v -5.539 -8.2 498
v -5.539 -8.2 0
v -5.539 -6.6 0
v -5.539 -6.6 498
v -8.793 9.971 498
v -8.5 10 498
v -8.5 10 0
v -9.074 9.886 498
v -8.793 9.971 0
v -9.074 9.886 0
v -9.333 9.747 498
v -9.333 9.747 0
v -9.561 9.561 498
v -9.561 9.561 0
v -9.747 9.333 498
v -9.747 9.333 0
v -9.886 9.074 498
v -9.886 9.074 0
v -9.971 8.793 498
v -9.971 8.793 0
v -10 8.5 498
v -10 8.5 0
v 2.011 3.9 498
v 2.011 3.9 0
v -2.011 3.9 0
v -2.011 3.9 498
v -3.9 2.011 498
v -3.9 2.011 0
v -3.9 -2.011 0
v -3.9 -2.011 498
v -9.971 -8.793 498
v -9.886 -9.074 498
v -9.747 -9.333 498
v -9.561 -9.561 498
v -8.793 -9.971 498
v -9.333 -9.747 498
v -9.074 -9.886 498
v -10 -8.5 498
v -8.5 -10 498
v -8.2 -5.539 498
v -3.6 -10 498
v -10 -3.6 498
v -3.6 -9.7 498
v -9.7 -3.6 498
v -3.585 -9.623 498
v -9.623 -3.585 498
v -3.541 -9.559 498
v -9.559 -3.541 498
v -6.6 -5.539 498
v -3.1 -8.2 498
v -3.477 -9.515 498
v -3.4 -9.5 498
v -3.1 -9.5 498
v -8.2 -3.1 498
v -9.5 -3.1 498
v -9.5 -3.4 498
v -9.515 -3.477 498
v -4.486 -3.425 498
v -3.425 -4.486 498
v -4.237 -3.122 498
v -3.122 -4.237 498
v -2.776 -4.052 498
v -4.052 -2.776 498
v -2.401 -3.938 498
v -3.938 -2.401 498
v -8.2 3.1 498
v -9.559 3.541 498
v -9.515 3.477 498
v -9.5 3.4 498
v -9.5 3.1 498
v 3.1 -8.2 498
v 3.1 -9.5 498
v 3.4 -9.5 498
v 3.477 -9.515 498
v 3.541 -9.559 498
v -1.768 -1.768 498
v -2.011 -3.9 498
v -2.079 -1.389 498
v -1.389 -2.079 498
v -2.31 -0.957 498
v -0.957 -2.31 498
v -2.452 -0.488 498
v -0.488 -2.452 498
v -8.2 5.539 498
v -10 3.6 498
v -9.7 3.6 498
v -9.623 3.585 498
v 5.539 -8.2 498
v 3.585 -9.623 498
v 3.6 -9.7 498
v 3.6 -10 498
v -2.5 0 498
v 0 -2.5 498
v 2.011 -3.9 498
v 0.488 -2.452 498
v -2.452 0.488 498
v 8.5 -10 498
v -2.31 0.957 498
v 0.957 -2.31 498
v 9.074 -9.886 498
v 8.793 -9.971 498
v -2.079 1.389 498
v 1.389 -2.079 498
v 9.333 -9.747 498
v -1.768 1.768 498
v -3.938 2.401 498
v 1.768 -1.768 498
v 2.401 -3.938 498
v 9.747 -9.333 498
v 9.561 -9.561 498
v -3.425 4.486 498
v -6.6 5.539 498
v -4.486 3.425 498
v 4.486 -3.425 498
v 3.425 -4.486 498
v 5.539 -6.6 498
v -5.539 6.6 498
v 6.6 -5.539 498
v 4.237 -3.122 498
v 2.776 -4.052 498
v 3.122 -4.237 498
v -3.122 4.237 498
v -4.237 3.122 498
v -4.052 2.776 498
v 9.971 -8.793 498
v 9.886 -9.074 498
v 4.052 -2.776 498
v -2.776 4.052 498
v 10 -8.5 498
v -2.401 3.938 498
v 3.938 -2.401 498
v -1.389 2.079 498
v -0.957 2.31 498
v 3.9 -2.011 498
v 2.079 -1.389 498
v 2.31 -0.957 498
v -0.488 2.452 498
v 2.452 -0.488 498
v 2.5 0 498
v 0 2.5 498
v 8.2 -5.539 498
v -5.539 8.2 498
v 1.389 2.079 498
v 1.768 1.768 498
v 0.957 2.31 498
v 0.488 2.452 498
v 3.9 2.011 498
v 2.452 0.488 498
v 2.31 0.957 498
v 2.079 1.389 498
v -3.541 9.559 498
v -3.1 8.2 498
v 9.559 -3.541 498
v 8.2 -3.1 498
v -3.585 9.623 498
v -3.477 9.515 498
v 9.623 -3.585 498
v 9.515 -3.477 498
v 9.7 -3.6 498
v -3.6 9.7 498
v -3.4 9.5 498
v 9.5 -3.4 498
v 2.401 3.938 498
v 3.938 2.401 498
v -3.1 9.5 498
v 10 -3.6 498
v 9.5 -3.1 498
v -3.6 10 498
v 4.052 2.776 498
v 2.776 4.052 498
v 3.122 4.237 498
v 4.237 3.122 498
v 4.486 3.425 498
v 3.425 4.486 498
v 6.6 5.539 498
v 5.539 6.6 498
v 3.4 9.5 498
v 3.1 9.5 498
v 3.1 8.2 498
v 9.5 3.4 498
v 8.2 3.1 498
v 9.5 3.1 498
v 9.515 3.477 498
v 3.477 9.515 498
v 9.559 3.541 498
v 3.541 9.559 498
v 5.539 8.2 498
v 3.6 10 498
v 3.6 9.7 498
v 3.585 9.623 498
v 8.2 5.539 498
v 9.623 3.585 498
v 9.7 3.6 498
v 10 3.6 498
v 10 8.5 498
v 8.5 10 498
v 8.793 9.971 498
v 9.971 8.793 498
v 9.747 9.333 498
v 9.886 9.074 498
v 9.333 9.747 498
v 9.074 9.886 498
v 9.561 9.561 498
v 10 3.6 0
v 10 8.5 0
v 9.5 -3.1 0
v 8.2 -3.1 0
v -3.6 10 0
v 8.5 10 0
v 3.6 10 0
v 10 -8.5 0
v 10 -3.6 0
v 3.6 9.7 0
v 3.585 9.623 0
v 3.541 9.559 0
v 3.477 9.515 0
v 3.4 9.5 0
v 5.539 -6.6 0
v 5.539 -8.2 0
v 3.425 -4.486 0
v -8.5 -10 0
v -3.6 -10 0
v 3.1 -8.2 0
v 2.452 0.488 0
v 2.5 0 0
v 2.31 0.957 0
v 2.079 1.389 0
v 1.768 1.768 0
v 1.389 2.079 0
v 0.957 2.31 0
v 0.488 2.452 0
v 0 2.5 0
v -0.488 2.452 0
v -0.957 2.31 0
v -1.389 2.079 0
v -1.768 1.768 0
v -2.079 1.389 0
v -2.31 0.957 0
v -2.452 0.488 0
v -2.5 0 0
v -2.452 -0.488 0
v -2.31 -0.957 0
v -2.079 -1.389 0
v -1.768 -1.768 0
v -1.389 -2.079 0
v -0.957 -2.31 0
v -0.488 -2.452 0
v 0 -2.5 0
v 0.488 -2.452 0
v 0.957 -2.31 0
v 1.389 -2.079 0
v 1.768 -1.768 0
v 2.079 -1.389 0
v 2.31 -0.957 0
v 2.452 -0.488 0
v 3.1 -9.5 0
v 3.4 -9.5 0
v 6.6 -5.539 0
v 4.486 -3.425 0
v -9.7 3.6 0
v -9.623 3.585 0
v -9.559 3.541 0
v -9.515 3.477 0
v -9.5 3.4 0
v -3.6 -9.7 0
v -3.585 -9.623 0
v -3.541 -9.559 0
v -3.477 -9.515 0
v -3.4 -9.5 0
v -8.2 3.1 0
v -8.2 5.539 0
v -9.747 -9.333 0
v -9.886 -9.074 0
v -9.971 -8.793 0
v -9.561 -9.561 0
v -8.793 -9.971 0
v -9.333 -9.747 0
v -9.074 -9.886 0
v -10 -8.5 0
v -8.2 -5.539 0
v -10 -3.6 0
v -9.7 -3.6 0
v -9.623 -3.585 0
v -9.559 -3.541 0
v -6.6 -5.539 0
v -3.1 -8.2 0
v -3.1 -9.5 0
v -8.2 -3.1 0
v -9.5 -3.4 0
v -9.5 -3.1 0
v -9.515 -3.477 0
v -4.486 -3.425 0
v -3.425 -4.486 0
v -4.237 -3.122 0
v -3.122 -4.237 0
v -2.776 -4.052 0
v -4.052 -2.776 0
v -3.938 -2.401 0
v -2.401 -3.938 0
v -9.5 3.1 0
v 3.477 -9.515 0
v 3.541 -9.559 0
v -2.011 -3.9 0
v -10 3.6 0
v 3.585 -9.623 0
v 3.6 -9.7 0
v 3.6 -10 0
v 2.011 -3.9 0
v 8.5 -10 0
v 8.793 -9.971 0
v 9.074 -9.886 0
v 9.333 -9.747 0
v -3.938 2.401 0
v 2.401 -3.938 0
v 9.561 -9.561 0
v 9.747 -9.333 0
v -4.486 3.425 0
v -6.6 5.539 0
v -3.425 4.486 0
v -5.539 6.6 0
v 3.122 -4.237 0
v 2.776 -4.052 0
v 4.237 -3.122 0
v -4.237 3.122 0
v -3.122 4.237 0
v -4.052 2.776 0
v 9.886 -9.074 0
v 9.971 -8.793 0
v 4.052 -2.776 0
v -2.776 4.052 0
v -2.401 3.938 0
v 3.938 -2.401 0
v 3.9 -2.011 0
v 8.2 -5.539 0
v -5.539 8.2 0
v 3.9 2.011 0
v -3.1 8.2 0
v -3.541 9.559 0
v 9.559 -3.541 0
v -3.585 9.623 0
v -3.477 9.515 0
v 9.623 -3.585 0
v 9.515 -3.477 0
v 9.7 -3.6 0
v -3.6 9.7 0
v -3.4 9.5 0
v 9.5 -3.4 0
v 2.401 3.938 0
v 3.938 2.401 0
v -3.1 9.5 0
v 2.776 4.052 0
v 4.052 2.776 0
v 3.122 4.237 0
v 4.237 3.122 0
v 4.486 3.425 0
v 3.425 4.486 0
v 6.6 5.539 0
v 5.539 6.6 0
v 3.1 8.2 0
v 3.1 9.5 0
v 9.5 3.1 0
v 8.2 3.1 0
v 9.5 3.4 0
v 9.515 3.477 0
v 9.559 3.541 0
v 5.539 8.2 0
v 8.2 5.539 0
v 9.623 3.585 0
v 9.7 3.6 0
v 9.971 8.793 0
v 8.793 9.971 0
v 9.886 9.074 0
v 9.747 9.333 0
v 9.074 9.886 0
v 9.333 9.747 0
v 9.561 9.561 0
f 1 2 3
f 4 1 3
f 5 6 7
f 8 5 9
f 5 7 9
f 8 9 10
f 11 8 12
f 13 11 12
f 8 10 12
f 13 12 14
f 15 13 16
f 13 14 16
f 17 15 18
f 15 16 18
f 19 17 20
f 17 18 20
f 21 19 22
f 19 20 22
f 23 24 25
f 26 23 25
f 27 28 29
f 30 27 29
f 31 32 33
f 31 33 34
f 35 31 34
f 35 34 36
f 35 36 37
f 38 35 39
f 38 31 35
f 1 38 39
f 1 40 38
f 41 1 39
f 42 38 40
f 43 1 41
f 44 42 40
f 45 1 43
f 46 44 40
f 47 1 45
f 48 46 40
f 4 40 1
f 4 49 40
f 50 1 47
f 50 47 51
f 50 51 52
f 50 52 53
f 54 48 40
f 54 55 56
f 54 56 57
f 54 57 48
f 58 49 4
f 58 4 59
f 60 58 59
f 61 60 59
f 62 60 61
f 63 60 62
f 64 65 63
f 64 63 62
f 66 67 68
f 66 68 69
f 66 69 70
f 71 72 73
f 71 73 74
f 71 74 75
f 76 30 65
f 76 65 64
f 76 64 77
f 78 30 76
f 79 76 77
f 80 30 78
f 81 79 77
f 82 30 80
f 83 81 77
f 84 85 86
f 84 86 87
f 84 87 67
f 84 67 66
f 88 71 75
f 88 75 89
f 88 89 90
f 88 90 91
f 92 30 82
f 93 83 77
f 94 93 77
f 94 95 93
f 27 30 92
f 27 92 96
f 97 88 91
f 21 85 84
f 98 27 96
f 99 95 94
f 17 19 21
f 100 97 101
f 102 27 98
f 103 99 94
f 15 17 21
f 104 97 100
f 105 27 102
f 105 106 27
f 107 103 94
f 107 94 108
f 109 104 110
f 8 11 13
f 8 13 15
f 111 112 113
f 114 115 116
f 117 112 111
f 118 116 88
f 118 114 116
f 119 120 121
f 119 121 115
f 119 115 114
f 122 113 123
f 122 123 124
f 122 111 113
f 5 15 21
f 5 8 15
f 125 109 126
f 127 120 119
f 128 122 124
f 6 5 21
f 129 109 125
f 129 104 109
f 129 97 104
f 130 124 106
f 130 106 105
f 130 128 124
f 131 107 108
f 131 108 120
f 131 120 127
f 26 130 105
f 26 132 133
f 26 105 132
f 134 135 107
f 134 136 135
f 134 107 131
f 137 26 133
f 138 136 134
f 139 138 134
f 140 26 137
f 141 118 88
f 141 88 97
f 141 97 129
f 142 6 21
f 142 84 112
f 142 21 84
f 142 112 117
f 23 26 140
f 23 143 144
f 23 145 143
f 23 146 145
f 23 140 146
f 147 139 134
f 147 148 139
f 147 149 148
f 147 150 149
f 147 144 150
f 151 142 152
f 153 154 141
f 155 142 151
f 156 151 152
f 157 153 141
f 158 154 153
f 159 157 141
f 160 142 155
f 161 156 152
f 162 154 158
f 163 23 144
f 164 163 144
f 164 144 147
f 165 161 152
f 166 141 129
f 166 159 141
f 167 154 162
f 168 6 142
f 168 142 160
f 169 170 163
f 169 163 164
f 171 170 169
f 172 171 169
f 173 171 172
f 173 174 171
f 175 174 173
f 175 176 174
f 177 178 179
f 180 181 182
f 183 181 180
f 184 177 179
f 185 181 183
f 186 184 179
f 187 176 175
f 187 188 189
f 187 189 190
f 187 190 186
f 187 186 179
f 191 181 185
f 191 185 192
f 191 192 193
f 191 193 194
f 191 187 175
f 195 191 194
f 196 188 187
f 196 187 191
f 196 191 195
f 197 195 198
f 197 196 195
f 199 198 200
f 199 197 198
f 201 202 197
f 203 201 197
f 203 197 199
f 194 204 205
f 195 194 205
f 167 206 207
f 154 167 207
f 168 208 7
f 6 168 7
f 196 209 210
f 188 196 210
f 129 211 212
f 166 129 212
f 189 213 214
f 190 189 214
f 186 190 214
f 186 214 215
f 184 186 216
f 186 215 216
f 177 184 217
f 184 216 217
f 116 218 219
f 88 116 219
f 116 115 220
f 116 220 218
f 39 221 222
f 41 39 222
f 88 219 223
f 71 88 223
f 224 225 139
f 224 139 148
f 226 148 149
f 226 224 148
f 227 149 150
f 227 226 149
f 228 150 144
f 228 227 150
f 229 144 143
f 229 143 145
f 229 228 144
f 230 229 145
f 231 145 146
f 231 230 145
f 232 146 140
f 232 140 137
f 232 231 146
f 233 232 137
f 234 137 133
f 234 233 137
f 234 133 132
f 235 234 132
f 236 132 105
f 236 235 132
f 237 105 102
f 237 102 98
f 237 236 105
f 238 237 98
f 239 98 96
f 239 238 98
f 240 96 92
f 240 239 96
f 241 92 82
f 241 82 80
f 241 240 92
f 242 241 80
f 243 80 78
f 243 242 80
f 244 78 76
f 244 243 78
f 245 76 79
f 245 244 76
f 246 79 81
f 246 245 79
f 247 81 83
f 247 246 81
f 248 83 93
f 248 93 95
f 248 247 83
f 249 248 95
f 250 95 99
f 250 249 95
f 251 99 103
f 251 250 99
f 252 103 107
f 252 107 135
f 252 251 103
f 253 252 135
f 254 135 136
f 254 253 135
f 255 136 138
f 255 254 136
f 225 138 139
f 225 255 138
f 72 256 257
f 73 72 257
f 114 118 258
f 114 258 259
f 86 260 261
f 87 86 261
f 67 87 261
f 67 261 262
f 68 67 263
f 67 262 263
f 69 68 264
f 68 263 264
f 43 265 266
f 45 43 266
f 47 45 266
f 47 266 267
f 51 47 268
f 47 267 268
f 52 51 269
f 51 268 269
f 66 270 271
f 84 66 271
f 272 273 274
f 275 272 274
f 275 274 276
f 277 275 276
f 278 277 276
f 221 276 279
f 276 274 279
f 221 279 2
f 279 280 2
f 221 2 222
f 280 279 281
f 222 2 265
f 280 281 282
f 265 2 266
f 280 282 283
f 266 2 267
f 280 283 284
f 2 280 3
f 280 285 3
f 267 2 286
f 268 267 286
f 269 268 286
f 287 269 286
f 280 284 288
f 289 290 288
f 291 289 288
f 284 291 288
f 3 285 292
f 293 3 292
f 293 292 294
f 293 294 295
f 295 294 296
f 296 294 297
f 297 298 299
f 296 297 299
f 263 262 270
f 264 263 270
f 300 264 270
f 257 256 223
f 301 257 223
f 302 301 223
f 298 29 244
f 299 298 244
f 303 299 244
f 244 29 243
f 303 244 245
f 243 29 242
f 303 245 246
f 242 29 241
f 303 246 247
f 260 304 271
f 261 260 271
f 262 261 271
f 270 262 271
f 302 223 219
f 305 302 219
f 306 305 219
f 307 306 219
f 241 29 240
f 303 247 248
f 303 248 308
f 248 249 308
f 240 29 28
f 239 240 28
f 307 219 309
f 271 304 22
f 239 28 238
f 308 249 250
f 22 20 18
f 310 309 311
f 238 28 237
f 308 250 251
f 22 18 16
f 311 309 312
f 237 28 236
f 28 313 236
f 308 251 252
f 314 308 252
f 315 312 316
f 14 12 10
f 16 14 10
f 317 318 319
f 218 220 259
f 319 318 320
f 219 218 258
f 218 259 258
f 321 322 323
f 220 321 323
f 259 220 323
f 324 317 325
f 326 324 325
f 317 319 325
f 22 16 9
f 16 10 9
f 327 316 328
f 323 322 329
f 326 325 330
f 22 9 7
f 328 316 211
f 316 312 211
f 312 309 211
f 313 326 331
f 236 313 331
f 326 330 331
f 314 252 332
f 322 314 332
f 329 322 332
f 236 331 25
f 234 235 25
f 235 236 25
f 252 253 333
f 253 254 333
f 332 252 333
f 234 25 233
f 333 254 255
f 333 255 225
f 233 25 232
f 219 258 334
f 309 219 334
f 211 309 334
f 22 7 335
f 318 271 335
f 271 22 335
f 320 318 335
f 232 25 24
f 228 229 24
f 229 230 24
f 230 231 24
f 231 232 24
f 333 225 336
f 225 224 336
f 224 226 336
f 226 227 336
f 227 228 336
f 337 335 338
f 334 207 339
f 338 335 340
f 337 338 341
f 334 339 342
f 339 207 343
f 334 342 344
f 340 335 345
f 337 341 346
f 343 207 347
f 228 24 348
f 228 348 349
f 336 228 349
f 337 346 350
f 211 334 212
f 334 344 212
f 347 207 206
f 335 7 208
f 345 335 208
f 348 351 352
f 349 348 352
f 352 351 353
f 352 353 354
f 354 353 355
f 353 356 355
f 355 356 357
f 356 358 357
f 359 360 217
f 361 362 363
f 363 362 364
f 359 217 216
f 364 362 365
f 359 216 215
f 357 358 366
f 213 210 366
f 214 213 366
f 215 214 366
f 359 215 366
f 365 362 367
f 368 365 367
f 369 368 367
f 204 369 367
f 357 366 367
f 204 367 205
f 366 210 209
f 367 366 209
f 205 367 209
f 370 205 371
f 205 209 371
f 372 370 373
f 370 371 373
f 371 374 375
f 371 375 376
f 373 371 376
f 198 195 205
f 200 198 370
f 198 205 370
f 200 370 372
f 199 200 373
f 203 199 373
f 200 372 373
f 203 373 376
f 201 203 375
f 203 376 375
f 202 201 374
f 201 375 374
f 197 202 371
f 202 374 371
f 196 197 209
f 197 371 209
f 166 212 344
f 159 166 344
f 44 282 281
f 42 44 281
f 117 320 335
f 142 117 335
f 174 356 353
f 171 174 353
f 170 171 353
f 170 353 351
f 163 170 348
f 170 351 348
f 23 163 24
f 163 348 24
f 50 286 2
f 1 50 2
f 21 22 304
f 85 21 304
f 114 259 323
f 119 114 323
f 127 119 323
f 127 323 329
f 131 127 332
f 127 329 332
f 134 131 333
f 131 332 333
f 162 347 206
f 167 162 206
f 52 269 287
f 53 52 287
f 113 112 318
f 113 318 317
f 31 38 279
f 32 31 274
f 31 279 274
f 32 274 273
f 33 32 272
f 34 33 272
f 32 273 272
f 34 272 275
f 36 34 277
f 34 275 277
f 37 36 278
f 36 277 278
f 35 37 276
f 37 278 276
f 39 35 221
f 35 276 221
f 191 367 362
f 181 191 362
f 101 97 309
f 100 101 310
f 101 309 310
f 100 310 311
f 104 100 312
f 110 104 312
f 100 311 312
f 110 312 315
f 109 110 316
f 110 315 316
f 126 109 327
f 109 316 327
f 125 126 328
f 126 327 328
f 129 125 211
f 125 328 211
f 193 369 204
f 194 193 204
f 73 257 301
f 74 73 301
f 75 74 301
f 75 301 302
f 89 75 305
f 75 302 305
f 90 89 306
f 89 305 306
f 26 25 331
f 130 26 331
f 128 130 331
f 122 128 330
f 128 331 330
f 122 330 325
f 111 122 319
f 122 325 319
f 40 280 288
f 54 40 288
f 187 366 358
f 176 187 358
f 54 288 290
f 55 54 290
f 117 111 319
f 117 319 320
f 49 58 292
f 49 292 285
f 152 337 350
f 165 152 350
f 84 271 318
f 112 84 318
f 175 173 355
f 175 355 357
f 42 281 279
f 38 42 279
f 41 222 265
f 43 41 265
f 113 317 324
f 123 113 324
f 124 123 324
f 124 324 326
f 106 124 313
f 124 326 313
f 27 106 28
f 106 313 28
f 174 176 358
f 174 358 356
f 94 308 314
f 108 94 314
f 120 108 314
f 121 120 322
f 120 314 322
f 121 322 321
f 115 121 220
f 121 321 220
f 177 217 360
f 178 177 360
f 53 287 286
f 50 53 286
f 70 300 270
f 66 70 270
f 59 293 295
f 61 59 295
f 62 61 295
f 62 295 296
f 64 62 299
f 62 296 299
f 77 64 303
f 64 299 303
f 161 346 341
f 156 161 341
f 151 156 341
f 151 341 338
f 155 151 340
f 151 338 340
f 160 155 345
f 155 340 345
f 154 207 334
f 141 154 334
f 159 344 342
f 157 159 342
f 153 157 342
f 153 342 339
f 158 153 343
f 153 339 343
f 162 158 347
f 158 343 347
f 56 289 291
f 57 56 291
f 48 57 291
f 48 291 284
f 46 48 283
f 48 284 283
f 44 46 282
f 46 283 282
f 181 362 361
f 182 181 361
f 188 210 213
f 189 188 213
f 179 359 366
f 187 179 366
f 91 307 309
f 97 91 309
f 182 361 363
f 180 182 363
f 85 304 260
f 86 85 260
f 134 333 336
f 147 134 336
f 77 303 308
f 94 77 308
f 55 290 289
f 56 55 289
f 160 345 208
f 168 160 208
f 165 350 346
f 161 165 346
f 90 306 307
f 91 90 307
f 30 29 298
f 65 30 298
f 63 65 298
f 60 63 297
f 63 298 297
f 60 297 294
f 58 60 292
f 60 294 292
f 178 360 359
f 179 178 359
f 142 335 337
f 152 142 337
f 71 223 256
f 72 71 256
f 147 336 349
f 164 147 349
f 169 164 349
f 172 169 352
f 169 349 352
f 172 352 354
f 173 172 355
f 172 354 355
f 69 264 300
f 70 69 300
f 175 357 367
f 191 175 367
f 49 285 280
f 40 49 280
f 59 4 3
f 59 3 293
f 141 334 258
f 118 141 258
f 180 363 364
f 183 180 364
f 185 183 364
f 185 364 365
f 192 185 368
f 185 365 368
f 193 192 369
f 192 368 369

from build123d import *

# Parameters (mm, degrees)
SKETCH1_R      = 2.5
EXTRUDE1_DEPTH = 498


with BuildPart() as part:
    # Sketch1 → Extrude1 (new body)
    with BuildSketch(Plane.XY):
        with BuildLine():
            Line((0, 3.9), (-2.010912703, 3.9))
            ThreePointArc((-2.010912703, 3.9), (-2.776279568, 4.052240935), (-3.425126266, 4.485786438))
            Line((-3.425126266, 4.485786438), (-5.539339828, 6.6))
            Line((-5.539339828, 6.6), (-5.539339828, 8.2))
            Line((-5.539339828, 8.2), (-3.1, 8.2))
            Line((-3.1, 8.2), (-3.1, 9.5))
            Line((-3.1, 9.5), (-3.4, 9.5))
            ThreePointArc((-3.4, 9.5), (-3.541421356, 9.558578644), (-3.6, 9.7))
            Line((-3.6, 9.7), (-3.6, 10))
            Line((-3.6, 10), (-8.5, 10))
            ThreePointArc((-8.5, 10), (-9.560660172, 9.560660172), (-10, 8.5))
            Line((-10, 8.5), (-10, 3.6))
            Line((-10, 3.6), (-9.7, 3.6))
            ThreePointArc((-9.7, 3.6), (-9.558578644, 3.541421356), (-9.5, 3.4))
            Line((-9.5, 3.4), (-9.5, 3.1))
            Line((-9.5, 3.1), (-8.2, 3.1))
            Line((-8.2, 3.1), (-8.2, 5.539339828))
            Line((-8.2, 5.539339828), (-6.6, 5.539339828))
            Line((-6.6, 5.539339828), (-4.485786438, 3.425126266))
            ThreePointArc((-4.485786438, 3.425126266), (-4.052240935, 2.776279568), (-3.9, 2.010912703))
            Line((-3.9, 2.010912703), (-3.9, 0))
            Line((-3.9, 0), (-3.9, -2.010912703))
            ThreePointArc((-3.9, -2.010912703), (-4.052240935, -2.776279568), (-4.485786438, -3.425126266))
            Line((-4.485786438, -3.425126266), (-6.6, -5.539339828))
            Line((-6.6, -5.539339828), (-8.2, -5.539339828))
            Line((-8.2, -5.539339828), (-8.2, -3.1))
            Line((-8.2, -3.1), (-9.5, -3.1))
            Line((-9.5, -3.1), (-9.5, -3.4))
            ThreePointArc((-9.5, -3.4), (-9.558578644, -3.541421356), (-9.7, -3.6))
            Line((-9.7, -3.6), (-10, -3.6))
            Line((-10, -3.6), (-10, -8.5))
            ThreePointArc((-10, -8.5), (-9.560660172, -9.560660172), (-8.5, -10))
            Line((-8.5, -10), (-3.6, -10))
            Line((-3.6, -10), (-3.6, -9.7))
            ThreePointArc((-3.6, -9.7), (-3.541421356, -9.558578644), (-3.4, -9.5))
            Line((-3.4, -9.5), (-3.1, -9.5))
            Line((-3.1, -9.5), (-3.1, -8.2))
            Line((-3.1, -8.2), (-5.539339828, -8.2))
            Line((-5.539339828, -8.2), (-5.539339828, -6.6))
            Line((-5.539339828, -6.6), (-3.425126266, -4.485786438))
            ThreePointArc((-3.425126266, -4.485786438), (-2.776279568, -4.052240935), (-2.010912703, -3.9))
            Line((-2.010912703, -3.9), (0, -3.9))
            Line((0, -3.9), (2.010912703, -3.9))
            ThreePointArc((2.010912703, -3.9), (2.776279568, -4.052240935), (3.425126266, -4.485786438))
            Line((3.425126266, -4.485786438), (5.539339828, -6.6))
            Line((5.539339828, -6.6), (5.539339828, -8.2))
            Line((5.539339828, -8.2), (3.1, -8.2))
            Line((3.1, -8.2), (3.1, -9.5))
            Line((3.1, -9.5), (3.4, -9.5))
            ThreePointArc((3.4, -9.5), (3.541421356, -9.558578644), (3.6, -9.7))
            Line((3.6, -9.7), (3.6, -10))
            Line((3.6, -10), (8.5, -10))
            ThreePointArc((8.5, -10), (9.560660172, -9.560660172), (10, -8.5))
            Line((10, -8.5), (10, -3.6))
            Line((10, -3.6), (9.7, -3.6))
            ThreePointArc((9.7, -3.6), (9.558578644, -3.541421356), (9.5, -3.4))
            Line((9.5, -3.4), (9.5, -3.1))
            Line((9.5, -3.1), (8.2, -3.1))
            Line((8.2, -3.1), (8.2, -5.539339828))
            Line((8.2, -5.539339828), (6.6, -5.539339828))
            Line((6.6, -5.539339828), (4.485786438, -3.425126266))
            ThreePointArc((4.485786438, -3.425126266), (4.052240935, -2.776279568), (3.9, -2.010912703))
            Line((3.9, -2.010912703), (3.9, 0))
            Line((3.9, 0), (3.9, 2.010912703))
            ThreePointArc((3.9, 2.010912703), (4.052240935, 2.776279568), (4.485786438, 3.425126266))
            Line((4.485786438, 3.425126266), (6.6, 5.539339828))
            Line((6.6, 5.539339828), (8.2, 5.539339828))
            Line((8.2, 5.539339828), (8.2, 3.1))
            Line((8.2, 3.1), (9.5, 3.1))
            Line((9.5, 3.1), (9.5, 3.4))
            ThreePointArc((9.5, 3.4), (9.558578644, 3.541421356), (9.7, 3.6))
            Line((9.7, 3.6), (10, 3.6))
            Line((10, 3.6), (10, 8.5))
            ThreePointArc((10, 8.5), (9.560660172, 9.560660172), (8.5, 10))
            Line((8.5, 10), (3.6, 10))
            Line((3.6, 10), (3.6, 9.7))
            ThreePointArc((3.6, 9.7), (3.541421356, 9.558578644), (3.4, 9.5))
            Line((3.4, 9.5), (3.1, 9.5))
            Line((3.1, 9.5), (3.1, 8.2))
            Line((3.1, 8.2), (5.539339828, 8.2))
            Line((5.539339828, 8.2), (5.539339828, 6.6))
            Line((5.539339828, 6.6), (3.425126266, 4.485786438))
            ThreePointArc((3.425126266, 4.485786438), (2.776279568, 4.052240935), (2.010912703, 3.9))
            Line((2.010912703, 3.9), (0, 3.9))
        make_face()
        Circle(SKETCH1_R, mode=Mode.SUBTRACT)
    extrude(amount=EXTRUDE1_DEPTH)


solid = part.part
